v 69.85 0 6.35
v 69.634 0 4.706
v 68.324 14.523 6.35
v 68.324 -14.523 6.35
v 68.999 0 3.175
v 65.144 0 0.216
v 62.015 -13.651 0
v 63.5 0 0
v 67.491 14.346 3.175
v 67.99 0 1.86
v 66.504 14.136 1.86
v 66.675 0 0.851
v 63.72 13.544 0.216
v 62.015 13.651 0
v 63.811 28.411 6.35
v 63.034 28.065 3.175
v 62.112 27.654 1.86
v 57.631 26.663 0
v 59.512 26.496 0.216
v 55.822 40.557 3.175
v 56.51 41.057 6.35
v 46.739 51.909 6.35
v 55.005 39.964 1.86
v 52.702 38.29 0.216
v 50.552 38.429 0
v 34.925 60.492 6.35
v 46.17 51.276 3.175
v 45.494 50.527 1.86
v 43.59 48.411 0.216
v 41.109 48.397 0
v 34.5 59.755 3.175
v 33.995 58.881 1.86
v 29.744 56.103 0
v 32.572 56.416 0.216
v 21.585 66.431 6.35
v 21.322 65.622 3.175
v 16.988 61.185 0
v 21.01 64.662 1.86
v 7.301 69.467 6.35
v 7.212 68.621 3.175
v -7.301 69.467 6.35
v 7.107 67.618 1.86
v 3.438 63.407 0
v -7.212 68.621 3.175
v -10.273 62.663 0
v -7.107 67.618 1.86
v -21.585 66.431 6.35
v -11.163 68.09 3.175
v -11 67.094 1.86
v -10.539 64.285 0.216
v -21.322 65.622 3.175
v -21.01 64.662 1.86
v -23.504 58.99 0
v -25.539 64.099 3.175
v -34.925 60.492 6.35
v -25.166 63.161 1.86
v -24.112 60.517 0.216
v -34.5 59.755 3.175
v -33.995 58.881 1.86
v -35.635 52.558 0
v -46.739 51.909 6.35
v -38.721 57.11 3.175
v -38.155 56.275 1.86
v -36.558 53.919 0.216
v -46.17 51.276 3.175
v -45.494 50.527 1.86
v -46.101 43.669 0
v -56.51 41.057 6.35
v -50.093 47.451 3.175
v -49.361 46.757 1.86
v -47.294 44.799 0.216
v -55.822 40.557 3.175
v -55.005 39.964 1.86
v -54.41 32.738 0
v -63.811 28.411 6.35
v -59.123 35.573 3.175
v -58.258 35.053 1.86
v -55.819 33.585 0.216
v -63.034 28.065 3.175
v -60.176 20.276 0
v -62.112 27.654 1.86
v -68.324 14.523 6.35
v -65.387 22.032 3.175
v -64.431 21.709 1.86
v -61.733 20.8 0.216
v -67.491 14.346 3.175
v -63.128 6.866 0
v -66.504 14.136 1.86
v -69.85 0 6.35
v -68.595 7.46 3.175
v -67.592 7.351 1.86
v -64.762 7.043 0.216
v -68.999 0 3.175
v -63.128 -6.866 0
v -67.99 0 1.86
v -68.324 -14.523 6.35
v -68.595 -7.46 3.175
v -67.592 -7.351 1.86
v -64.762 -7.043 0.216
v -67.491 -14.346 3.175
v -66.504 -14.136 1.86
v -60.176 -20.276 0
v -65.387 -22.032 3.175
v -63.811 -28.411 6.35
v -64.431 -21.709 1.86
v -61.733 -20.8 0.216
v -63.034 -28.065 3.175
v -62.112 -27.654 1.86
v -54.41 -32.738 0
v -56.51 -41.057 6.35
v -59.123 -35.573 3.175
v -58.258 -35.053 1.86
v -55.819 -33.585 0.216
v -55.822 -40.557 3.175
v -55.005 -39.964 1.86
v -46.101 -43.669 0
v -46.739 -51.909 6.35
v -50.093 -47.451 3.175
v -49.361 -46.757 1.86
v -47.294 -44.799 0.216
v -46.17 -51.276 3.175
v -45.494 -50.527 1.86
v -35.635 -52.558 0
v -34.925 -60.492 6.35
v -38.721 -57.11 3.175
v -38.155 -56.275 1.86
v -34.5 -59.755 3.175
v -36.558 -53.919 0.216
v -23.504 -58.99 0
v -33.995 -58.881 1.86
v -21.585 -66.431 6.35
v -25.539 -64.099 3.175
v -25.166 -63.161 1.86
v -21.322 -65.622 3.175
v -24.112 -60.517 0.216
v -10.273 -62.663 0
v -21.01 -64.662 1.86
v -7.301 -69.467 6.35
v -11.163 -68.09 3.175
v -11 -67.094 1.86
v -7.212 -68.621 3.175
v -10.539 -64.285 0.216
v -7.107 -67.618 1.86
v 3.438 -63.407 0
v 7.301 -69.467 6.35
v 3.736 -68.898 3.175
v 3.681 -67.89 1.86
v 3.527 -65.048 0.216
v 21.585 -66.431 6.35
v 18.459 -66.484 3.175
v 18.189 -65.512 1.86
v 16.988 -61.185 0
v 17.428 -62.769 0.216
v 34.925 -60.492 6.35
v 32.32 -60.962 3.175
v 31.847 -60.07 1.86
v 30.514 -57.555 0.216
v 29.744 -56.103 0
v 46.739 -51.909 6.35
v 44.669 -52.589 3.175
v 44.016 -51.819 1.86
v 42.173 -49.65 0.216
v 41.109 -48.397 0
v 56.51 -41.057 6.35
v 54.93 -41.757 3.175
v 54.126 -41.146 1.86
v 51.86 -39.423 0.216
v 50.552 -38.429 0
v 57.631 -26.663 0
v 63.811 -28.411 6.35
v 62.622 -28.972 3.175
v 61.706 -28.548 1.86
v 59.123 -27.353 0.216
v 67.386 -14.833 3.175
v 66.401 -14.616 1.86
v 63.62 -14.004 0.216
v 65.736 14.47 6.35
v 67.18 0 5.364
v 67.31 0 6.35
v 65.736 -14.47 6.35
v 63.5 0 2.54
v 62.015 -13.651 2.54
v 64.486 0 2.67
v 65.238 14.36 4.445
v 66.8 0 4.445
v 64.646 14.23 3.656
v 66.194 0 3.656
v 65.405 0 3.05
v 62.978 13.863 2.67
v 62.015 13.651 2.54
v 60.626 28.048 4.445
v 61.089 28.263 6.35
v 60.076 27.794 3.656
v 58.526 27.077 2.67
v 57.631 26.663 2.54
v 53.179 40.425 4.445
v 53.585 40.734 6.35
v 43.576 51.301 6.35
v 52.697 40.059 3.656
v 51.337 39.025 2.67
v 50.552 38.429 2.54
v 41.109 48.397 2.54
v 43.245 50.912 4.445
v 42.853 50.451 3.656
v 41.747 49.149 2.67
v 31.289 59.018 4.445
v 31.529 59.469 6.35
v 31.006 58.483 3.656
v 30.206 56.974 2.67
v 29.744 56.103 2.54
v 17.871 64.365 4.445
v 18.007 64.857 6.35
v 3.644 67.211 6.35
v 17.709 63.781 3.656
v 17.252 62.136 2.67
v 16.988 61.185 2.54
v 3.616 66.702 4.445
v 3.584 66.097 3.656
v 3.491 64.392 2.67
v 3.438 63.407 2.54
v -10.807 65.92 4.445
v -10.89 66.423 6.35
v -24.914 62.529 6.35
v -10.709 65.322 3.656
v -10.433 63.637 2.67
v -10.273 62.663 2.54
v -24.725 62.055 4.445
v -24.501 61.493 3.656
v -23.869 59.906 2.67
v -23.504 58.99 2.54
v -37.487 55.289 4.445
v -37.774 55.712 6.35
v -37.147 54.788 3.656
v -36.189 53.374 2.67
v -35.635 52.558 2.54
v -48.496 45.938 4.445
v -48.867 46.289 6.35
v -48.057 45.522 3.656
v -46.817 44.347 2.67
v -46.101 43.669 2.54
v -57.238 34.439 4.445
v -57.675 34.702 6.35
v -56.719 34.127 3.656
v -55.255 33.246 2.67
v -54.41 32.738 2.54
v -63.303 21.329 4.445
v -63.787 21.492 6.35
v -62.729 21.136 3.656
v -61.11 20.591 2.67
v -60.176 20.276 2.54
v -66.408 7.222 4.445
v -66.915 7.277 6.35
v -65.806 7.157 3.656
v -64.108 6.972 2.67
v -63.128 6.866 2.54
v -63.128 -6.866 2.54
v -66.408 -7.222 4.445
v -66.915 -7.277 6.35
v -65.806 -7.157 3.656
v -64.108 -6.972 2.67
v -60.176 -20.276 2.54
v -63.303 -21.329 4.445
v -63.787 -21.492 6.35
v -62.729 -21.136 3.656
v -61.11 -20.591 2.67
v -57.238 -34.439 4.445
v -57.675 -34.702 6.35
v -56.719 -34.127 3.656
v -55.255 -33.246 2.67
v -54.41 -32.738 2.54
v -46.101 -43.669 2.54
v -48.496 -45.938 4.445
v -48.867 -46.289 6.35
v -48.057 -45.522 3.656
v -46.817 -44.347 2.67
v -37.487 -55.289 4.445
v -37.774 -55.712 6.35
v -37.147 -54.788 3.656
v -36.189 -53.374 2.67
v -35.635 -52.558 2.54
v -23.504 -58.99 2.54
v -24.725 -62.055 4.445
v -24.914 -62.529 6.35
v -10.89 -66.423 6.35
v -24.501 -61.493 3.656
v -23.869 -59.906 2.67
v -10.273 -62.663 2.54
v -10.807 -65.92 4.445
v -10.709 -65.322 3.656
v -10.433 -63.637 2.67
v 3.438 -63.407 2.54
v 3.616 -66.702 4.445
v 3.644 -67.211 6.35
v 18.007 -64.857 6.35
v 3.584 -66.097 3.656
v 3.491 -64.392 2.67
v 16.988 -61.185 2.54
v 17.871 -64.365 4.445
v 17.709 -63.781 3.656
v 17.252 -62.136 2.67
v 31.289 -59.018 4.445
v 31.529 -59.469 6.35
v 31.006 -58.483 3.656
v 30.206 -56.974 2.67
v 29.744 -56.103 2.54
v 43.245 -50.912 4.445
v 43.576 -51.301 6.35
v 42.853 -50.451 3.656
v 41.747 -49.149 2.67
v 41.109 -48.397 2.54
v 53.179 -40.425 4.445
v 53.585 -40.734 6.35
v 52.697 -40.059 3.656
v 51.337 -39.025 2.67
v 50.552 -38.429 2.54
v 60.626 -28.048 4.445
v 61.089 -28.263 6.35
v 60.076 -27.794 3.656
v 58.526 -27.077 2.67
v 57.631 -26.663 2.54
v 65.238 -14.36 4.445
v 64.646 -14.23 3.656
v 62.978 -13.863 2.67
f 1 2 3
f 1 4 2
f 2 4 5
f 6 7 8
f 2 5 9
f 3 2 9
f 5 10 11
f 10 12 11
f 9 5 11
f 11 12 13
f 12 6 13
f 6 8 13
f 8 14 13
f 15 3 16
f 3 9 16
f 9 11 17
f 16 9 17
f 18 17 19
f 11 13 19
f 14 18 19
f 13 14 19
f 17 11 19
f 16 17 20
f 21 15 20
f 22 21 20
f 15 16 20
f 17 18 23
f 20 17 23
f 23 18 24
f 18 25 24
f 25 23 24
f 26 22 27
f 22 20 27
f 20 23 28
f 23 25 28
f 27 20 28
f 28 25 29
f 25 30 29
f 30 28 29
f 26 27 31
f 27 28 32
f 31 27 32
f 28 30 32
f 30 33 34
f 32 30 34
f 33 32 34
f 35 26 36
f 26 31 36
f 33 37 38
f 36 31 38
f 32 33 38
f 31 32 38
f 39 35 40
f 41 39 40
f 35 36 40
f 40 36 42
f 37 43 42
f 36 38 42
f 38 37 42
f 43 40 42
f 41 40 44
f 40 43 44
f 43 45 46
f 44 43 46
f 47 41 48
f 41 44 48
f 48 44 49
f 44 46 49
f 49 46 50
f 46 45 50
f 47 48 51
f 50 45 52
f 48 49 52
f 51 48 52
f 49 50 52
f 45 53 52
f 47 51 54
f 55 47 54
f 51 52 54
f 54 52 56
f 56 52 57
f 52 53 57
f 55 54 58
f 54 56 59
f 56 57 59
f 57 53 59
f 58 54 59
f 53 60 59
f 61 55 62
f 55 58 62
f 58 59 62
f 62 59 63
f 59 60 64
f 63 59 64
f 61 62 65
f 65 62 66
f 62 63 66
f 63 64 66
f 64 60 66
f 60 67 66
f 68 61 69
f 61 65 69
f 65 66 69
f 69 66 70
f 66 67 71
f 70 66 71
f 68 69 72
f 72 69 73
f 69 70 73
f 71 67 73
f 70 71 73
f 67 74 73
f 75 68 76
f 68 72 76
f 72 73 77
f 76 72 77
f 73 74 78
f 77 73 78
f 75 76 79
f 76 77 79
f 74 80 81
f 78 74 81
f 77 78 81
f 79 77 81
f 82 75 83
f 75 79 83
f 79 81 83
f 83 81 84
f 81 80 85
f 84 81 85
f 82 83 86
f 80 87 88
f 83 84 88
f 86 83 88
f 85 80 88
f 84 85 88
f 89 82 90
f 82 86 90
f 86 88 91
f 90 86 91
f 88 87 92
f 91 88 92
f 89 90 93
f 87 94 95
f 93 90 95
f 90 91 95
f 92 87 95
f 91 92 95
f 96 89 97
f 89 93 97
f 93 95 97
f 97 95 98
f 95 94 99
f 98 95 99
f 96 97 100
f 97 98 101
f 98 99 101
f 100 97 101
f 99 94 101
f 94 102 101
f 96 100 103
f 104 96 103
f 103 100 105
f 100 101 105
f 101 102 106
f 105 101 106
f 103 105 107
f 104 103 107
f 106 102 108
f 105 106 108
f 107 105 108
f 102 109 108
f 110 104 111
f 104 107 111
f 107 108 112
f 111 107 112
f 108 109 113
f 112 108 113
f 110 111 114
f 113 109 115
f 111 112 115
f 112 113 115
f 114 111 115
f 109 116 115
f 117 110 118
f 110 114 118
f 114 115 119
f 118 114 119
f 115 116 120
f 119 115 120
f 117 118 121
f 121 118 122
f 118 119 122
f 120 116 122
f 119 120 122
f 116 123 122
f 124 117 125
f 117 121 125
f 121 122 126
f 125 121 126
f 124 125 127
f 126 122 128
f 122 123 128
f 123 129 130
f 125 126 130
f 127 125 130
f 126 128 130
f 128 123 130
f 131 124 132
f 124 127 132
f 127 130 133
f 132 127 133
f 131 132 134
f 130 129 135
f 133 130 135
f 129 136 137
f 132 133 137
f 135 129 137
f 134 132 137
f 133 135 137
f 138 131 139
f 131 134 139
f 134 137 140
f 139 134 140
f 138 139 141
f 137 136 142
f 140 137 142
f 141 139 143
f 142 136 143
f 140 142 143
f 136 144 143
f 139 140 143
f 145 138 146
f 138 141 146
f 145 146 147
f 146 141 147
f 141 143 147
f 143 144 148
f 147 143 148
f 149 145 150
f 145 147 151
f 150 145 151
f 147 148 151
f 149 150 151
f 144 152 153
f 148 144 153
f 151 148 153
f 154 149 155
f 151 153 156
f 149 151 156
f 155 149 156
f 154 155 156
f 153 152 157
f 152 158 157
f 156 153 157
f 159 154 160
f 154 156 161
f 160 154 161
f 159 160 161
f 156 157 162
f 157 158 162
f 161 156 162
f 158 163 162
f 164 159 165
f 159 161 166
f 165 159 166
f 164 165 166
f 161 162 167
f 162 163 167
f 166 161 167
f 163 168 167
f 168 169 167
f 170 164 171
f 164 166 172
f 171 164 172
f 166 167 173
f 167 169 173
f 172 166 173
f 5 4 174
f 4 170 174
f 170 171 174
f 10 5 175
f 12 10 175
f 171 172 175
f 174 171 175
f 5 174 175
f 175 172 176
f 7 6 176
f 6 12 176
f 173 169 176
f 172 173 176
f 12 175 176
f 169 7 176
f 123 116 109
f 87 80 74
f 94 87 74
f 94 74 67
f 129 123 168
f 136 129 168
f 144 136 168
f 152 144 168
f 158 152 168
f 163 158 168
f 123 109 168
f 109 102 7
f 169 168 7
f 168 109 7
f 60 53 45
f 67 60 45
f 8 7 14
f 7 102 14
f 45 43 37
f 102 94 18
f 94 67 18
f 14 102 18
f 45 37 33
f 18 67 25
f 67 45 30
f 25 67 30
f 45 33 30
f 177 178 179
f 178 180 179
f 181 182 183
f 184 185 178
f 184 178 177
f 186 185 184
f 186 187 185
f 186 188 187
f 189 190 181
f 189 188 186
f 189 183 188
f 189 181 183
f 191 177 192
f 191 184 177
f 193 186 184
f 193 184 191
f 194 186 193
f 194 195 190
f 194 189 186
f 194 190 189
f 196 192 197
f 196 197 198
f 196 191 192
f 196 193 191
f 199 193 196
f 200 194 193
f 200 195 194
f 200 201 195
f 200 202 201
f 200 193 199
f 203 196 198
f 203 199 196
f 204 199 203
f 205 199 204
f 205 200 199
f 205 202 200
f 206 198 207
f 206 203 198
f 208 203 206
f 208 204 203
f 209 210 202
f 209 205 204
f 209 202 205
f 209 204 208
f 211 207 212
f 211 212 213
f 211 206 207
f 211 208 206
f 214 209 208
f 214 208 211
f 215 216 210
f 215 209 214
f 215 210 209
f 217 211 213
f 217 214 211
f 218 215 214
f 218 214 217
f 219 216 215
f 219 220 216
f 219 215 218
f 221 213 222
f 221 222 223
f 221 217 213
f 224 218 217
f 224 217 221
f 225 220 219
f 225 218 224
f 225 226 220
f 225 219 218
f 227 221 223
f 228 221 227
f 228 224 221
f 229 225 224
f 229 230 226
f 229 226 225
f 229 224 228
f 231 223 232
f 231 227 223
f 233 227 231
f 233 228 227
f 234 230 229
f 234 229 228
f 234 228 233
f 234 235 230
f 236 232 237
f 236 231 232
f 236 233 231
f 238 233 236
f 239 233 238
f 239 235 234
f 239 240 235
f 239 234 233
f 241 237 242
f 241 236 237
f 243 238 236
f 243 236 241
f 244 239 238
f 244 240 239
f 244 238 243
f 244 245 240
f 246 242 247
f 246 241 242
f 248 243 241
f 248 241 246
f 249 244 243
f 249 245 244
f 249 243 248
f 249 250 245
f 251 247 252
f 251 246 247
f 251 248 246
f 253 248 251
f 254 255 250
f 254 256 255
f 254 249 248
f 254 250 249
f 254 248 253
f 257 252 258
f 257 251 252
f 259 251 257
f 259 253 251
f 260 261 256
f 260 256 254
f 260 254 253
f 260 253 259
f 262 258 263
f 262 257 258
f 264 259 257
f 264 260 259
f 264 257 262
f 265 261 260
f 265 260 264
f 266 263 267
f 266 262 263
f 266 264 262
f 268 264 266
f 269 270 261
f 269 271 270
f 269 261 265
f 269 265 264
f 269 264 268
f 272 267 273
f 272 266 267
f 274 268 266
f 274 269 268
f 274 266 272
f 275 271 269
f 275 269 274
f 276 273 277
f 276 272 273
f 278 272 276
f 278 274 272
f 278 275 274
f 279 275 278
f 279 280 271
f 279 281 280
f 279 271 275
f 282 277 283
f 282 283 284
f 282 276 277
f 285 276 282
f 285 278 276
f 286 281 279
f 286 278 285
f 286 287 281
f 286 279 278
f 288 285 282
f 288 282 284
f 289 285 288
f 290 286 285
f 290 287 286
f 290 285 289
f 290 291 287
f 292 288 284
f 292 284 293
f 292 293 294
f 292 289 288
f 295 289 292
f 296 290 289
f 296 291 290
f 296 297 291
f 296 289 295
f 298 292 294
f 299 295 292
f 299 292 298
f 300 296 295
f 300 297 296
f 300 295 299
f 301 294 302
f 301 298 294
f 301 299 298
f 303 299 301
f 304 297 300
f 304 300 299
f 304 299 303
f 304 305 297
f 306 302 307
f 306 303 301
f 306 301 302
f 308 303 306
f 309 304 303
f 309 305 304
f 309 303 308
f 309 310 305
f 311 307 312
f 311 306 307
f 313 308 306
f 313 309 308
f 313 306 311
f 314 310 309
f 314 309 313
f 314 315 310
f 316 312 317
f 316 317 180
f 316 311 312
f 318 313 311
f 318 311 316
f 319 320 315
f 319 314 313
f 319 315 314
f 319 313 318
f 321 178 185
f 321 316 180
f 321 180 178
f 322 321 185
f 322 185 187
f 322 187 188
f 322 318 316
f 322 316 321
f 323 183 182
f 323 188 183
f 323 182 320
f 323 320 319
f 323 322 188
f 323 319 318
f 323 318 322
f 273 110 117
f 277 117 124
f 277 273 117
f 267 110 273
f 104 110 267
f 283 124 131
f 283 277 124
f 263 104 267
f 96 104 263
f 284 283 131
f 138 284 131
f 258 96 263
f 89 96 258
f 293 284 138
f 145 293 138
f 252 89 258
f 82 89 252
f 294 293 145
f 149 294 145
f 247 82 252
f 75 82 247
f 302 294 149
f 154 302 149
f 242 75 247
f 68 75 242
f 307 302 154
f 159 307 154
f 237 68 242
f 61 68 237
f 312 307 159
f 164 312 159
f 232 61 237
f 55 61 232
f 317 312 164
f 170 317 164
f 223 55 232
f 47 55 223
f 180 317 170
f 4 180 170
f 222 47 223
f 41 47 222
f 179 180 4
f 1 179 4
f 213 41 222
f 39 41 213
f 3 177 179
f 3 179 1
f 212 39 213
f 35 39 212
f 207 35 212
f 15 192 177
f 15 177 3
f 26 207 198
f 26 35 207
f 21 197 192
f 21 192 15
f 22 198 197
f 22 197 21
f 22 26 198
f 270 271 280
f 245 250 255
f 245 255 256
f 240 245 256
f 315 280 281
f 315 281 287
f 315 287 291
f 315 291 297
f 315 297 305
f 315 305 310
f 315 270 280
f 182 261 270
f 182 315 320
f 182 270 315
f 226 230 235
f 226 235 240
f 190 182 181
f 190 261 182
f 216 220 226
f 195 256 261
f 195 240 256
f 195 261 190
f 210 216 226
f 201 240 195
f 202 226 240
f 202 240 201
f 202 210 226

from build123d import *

# Parameters (mm, degrees)
F0_R     = 69.85
F1_DEPTH = 6.35
F2_R     = 6.34999
F3_T     = 2.54


# Not quite as in the source:
# - a fillet or chamfer is up to 0.001 mm smaller than in the source, because OpenCascade refuses the exact size
# - a shell that OpenCascade refuses in one call is made with other operations: the cavity is built on its own and cut out


with BuildPart() as f1:
    # F0 (on Top) → F1 (new body)
    with BuildSketch(Plane.XY):
        Circle(F0_R)
    extrude(amount=F1_DEPTH)

    # F2 (radius 6.35 in the source; OpenCascade refuses exactly that, so slightly less here)
    f2_edges = [f1.edges().sort_by_distance(p)[0] for p in [
        (-69.85, 0, 0),
    ]]
    fillet(f2_edges, radius=F2_R)

    # F3: shell of thickness 2.54, made by hand


with BuildPart() as f3_core1:
    # F3_t2: copy of F1
    add(f1.part)

    # the walls: a layer under each face that stays
    f3_faces = [f3_core1.faces().sort_by_distance(p)[0] for p in [
        (-69.85, 0, 6.349995),
        (-67.9901309895, 0, 1.8598690105),
        (0, 0, 0),
    ]]
    thicken(f3_faces, amount=-F3_T, mode=Mode.SUBTRACT)


with BuildPart() as f1_1:
    add(f1.part)

    # what is left inside the walls is the cavity
    f3_cavity = [f3_core1.part.solids().sort_by_distance(p)[0] for p in [
        (0, -22.436667, 6.3246),
    ]]
    add(f3_cavity, mode=Mode.SUBTRACT)


solid = f1_1.part
